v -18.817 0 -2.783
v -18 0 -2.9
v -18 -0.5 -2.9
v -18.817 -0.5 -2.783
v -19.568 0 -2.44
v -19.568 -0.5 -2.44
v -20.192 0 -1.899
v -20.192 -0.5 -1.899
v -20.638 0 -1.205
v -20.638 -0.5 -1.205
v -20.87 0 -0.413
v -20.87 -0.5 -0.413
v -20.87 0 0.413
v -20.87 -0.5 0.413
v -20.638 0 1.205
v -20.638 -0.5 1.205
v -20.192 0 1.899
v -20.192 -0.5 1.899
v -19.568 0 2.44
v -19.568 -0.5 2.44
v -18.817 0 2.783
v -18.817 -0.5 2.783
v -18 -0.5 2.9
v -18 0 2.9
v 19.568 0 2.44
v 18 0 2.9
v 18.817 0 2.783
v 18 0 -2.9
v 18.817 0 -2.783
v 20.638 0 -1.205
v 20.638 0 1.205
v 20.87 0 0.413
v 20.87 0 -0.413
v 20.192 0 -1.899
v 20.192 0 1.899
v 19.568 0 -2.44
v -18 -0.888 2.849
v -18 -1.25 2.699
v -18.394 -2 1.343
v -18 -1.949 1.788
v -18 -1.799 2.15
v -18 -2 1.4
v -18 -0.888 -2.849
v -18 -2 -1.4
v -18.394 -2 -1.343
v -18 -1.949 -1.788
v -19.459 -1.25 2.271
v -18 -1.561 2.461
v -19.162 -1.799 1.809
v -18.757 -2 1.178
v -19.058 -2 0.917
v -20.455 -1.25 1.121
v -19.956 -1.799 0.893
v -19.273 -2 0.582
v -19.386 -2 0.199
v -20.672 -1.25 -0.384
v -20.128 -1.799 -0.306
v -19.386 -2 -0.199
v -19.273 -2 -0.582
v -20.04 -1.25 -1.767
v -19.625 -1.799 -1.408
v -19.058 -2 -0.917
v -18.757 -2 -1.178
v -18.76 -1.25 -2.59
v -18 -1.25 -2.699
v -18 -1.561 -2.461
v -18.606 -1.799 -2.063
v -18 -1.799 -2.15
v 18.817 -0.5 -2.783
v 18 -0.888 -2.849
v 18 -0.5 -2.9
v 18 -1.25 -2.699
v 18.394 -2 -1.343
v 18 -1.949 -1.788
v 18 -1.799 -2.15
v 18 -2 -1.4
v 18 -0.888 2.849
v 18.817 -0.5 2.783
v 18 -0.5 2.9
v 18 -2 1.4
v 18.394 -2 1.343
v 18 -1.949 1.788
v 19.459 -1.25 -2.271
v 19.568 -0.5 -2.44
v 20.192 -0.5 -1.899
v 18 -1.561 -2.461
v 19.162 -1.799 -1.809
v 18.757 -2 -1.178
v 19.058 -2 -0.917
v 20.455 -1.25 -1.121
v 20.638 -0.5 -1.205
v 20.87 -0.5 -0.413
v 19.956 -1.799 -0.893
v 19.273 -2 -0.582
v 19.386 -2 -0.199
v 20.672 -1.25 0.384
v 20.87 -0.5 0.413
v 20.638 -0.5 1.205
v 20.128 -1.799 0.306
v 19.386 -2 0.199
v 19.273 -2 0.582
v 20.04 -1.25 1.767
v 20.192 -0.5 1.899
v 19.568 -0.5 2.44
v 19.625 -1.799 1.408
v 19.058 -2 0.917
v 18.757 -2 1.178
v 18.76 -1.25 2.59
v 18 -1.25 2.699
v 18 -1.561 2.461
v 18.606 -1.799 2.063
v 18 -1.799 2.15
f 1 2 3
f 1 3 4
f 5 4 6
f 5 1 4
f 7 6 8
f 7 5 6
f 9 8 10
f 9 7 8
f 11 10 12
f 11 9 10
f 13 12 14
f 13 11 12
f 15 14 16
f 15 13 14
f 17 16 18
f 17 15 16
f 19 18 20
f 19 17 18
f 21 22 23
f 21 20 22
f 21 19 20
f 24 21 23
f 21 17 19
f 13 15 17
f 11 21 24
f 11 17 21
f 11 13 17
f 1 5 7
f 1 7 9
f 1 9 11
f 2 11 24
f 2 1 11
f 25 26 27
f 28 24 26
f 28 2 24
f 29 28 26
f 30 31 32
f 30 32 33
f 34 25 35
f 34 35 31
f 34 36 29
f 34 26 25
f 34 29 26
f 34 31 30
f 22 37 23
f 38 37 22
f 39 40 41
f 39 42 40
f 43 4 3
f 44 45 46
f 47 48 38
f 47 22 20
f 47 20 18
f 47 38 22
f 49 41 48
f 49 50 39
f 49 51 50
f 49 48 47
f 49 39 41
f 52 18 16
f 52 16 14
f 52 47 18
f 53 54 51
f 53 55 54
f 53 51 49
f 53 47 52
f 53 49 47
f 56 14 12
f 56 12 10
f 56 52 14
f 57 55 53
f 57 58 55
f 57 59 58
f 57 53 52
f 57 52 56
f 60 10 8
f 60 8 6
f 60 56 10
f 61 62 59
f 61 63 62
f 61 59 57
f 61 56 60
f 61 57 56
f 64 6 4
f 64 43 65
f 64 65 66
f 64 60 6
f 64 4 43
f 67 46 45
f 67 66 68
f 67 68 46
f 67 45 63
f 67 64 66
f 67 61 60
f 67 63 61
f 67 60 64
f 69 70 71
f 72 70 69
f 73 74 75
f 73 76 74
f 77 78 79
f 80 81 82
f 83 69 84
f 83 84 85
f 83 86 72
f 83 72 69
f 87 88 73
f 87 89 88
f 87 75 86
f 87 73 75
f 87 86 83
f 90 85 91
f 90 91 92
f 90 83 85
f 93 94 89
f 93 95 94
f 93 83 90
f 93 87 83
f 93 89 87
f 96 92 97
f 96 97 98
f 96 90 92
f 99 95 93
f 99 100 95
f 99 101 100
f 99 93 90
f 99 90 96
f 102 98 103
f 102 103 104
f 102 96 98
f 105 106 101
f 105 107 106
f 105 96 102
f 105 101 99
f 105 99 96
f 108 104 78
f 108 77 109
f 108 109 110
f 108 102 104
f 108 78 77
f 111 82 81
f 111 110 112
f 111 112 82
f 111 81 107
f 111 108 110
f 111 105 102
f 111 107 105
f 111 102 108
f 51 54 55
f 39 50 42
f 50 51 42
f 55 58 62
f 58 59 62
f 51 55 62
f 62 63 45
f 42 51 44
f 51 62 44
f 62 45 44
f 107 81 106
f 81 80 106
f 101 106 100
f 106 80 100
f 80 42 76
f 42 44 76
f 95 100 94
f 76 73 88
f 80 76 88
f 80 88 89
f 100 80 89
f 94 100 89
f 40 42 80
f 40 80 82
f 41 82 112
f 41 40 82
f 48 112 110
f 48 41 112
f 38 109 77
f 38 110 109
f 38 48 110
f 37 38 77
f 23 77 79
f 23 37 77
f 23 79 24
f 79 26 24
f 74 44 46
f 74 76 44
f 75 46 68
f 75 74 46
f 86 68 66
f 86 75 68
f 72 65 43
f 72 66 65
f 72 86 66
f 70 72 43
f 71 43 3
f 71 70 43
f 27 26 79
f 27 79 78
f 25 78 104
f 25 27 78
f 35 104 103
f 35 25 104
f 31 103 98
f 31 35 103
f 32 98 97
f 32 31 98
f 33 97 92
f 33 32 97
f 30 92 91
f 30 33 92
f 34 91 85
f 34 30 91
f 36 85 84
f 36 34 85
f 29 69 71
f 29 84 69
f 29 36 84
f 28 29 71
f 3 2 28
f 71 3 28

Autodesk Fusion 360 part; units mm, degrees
sketch "SKUF" plane through (0, 0, 0) normal (0, 1, 0) x (1, 0, 0)
  line L0 (-18, 2.9) -> (18, 2.9)
  line L1 (18, 2.9) -> (18, -2.9) construction
  line L2 (18, -2.9) -> (-18, -2.9)
  line L3 (-18, -2.9) -> (-18, 2.9) construction
  arc A0 (-18, 2.9) -> (-18, -2.9) centre (-18, 0) ccw
  arc A1 (18, -2.9) -> (18, 2.9) centre (18, 0) ccw
  line L4 (0, 2.9) -> (0, -2.9) construction
  line L5 (-20.9, 0) -> (20.9, 0) construction
  dimension "d1" = 5.8
  dimension "d2" = 36
  dimension "d10" = 41.6
extrude "Basic shape extrusion" add sketch "SKUF" against normal blind 2
fillet "Bottom fillet" radius 1.5 4 edges at (0, -2, -2.9) (20.9, -2, 0) (0, -2, 2.9) (-20.9, -2, 0)
equation "d1 = SKUF_Z"
equation "d2 = SKUF_X"
equation "d3 = -SKUF_Y"
equation "d5 = SKUF_STICK_OUT"
equation "SKUF_X = 36 mm" comment "42mm X slot"
equation "SKUF_Y = 2.00 mm"
equation "SKUF_Z = 5.80 mm" comment "6mm Z slot"
equation "SKUF_SLOT_Y = 0.50 mm" comment "0.5mm Y slot"
equation "SKUF_STICK_OUT = SKUF_Y - SKUF_SLOT_Y"
properties part number "RW_PARAMETRIC_BUMPON"
